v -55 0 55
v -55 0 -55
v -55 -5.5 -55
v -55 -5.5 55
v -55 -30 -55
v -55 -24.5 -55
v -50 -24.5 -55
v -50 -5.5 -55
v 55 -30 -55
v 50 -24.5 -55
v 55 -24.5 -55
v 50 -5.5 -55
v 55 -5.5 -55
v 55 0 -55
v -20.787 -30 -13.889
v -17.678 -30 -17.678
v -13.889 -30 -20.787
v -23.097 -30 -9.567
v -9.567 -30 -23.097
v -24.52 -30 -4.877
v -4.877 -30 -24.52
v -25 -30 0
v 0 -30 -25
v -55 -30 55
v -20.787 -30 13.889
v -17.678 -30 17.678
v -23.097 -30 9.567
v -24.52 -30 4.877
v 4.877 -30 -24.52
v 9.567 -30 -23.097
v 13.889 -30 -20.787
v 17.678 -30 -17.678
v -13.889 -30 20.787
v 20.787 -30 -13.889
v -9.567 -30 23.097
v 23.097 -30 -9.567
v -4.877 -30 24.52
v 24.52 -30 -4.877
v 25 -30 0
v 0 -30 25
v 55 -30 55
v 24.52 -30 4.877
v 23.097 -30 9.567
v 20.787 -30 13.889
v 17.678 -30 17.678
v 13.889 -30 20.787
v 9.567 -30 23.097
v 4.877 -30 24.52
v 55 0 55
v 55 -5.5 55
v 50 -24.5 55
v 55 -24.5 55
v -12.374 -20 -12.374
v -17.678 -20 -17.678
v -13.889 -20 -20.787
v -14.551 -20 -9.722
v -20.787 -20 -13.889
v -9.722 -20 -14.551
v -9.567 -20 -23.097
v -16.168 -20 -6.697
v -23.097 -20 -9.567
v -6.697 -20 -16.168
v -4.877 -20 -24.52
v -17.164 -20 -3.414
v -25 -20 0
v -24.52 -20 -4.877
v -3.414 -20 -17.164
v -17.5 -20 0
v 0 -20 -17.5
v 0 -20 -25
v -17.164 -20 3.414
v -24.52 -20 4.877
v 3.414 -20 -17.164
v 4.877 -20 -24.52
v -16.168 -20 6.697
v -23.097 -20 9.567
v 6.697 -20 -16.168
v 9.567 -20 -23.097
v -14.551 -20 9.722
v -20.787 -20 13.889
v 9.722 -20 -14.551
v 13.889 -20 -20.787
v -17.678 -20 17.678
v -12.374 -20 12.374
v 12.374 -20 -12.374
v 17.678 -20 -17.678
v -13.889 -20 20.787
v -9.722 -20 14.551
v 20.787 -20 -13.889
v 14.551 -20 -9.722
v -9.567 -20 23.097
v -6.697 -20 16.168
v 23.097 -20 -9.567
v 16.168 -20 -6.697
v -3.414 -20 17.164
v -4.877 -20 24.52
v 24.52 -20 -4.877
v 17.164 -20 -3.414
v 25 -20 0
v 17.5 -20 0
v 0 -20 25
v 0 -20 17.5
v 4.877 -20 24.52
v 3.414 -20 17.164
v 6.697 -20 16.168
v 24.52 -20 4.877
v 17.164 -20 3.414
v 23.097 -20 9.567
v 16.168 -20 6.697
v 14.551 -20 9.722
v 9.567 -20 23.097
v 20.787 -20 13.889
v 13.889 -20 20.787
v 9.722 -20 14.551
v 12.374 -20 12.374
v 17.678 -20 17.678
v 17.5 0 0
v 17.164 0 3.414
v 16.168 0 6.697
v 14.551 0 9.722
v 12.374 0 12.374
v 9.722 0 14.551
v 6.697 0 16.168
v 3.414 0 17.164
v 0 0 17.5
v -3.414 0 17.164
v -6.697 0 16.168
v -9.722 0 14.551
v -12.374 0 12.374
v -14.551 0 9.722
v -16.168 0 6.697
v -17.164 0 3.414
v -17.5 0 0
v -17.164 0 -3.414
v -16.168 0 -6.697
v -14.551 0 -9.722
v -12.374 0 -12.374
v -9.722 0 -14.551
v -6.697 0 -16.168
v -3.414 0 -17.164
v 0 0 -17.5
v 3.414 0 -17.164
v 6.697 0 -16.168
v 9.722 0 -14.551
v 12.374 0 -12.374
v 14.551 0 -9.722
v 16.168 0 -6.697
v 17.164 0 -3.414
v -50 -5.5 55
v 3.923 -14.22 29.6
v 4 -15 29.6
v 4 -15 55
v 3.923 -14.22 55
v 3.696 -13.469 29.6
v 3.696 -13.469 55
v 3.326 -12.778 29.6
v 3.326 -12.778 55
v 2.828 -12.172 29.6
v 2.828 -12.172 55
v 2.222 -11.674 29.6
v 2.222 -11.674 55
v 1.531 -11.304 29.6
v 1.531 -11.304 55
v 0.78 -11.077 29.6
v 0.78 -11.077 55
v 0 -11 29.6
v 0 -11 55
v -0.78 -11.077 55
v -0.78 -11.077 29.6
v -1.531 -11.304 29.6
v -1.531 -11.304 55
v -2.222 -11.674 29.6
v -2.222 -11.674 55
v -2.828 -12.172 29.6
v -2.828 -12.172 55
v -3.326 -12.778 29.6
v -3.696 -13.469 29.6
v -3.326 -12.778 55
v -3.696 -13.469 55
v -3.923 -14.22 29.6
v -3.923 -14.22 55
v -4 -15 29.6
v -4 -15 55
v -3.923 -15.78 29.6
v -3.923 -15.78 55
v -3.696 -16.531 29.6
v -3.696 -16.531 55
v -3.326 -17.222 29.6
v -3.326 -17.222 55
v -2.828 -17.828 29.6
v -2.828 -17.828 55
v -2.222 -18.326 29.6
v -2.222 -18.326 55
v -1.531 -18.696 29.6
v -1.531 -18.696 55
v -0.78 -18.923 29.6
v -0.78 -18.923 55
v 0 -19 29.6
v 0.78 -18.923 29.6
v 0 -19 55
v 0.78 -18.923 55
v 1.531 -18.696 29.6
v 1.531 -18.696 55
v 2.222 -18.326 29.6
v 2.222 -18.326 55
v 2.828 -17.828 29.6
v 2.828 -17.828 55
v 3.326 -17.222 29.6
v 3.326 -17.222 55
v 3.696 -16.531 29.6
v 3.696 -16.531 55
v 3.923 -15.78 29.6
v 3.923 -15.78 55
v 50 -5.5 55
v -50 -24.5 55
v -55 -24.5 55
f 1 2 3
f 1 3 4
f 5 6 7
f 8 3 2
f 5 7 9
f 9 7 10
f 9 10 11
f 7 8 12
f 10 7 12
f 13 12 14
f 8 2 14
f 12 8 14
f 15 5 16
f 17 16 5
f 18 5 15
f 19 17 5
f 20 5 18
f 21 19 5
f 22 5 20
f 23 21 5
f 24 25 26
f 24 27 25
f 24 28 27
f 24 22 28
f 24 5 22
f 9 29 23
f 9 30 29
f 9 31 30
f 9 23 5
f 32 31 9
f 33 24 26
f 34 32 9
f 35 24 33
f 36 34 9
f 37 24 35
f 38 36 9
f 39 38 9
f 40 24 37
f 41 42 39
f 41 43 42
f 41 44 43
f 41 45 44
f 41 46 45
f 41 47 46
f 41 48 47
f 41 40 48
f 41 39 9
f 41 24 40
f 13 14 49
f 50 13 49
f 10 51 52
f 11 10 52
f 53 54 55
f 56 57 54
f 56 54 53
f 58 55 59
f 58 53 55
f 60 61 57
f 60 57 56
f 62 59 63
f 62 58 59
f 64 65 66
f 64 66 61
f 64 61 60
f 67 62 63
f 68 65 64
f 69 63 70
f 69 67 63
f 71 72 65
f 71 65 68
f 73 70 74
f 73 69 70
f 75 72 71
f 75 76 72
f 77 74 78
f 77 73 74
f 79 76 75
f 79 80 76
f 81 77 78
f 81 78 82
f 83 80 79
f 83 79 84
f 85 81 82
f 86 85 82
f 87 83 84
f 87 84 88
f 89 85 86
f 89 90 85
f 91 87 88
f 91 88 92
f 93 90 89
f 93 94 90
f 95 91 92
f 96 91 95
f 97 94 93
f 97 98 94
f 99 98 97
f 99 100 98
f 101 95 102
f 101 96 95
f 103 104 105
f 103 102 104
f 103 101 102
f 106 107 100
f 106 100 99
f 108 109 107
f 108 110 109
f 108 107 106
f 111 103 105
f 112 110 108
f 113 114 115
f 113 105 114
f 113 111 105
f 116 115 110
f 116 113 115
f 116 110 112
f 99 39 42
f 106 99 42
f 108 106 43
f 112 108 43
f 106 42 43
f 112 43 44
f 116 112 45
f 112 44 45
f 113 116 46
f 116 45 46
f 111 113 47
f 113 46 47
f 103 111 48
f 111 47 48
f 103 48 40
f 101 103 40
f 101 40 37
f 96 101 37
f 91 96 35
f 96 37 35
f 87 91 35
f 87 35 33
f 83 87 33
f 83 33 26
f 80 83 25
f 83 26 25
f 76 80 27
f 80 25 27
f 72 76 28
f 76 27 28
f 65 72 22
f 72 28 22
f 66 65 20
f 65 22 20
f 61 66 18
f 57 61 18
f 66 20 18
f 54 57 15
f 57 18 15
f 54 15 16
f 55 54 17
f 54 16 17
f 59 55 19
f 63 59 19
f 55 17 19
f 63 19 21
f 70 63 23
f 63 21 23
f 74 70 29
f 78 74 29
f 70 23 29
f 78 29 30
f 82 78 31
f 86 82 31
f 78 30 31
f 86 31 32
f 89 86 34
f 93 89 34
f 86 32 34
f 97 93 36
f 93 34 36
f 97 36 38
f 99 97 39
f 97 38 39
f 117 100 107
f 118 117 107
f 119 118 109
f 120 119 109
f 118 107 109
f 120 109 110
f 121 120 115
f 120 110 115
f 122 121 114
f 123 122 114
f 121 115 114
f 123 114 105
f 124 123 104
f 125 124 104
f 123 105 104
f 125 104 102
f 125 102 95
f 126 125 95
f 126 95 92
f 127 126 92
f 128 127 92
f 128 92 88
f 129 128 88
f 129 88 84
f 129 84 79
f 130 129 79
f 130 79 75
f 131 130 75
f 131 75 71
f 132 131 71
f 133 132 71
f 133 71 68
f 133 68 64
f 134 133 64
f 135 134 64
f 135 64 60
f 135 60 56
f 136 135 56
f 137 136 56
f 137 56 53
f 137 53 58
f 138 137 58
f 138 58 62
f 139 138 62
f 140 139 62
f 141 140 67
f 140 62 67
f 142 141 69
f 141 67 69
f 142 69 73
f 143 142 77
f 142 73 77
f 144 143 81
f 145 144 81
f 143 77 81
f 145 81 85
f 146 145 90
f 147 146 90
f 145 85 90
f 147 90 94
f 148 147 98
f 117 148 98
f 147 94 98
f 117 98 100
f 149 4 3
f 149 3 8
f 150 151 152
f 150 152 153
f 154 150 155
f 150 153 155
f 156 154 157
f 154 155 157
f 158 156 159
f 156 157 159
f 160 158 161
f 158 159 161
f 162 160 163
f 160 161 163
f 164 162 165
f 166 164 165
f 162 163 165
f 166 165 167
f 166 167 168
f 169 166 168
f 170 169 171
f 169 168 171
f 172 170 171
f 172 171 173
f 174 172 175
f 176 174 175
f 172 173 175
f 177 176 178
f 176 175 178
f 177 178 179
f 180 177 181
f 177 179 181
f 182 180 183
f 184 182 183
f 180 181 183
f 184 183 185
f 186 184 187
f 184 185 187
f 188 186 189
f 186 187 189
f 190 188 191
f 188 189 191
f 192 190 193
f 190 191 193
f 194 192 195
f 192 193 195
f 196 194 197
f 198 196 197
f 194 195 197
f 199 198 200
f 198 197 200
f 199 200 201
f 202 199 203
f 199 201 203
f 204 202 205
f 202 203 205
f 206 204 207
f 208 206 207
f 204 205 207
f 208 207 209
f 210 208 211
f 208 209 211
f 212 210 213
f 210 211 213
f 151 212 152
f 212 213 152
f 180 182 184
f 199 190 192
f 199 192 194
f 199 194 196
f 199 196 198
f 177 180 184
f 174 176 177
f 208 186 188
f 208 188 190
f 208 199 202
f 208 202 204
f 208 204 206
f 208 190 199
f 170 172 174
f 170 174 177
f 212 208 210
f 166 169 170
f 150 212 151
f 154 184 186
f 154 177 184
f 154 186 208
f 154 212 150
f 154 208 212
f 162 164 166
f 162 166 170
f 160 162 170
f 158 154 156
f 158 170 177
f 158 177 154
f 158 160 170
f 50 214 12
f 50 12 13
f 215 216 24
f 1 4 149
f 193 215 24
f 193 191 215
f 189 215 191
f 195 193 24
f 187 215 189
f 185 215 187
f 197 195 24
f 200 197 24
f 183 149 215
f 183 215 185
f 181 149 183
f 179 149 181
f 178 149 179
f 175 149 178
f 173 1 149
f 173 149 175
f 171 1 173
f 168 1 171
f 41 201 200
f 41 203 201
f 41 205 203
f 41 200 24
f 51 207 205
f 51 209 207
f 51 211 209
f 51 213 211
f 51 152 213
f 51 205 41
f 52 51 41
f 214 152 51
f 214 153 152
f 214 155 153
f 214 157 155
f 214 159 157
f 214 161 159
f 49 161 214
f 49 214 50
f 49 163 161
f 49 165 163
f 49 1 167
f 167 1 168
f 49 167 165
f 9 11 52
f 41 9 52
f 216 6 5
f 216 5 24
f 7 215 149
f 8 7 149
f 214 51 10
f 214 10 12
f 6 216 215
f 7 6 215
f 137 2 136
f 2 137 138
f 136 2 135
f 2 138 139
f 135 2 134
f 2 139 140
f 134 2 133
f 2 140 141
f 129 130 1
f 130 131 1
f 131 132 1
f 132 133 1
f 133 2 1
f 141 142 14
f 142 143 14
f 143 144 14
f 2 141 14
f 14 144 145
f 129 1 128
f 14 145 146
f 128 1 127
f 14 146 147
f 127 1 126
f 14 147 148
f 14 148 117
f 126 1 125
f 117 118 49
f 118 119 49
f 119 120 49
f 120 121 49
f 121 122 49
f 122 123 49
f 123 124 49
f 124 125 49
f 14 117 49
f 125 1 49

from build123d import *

# Parameters (mm, degrees)
F0_W      = 110
F0_H      = 110
F1_DEPTH  = 30
F2_R      = 25
F2_R_2    = 17.5
F3_DEPTH  = 10
F3_FACE_R = 17.5
F4_DEPTH  = 30.001
F5_W      = 10
F5_H      = 19
F6_DEPTH  = 110.001
F7_R      = 4
F8_DEPTH  = 25.4


with BuildPart() as f1:
    # F0 (on Front) → F1 (new body)
    with BuildSketch(Plane.XZ):
        Rectangle(F0_W, F0_H)
    extrude(amount=F1_DEPTH)

    # F2 (on face) → F3 (cut)
    with BuildSketch(Plane.XZ.offset(30)):
        Circle(F2_R)
        Circle(F2_R_2, mode=Mode.SUBTRACT)
    extrude(amount=-F3_DEPTH, mode=Mode.SUBTRACT)

    # F3_face (on face) → F4 (cut, through all)
    with BuildSketch(Plane.XZ.offset(30)):
        Circle(F3_FACE_R)
    extrude(amount=-F4_DEPTH, mode=Mode.SUBTRACT)

    # F5 (on face) → F6 (cut, through all)
    with BuildSketch(Plane.XY.offset(55)):
        with Locations((-55, -15)):
            Rectangle(F5_W, F5_H)
        with Locations((55, -15)):
            Rectangle(F5_W, F5_H)
    extrude(amount=-F6_DEPTH, mode=Mode.SUBTRACT)

    # F7 (on face) → F8 (cut)
    with BuildSketch(Plane.XY.offset(55)):
        with Locations((0, -15)):
            Circle(F7_R)
    extrude(amount=-F8_DEPTH, mode=Mode.SUBTRACT)


solid = f1.part
